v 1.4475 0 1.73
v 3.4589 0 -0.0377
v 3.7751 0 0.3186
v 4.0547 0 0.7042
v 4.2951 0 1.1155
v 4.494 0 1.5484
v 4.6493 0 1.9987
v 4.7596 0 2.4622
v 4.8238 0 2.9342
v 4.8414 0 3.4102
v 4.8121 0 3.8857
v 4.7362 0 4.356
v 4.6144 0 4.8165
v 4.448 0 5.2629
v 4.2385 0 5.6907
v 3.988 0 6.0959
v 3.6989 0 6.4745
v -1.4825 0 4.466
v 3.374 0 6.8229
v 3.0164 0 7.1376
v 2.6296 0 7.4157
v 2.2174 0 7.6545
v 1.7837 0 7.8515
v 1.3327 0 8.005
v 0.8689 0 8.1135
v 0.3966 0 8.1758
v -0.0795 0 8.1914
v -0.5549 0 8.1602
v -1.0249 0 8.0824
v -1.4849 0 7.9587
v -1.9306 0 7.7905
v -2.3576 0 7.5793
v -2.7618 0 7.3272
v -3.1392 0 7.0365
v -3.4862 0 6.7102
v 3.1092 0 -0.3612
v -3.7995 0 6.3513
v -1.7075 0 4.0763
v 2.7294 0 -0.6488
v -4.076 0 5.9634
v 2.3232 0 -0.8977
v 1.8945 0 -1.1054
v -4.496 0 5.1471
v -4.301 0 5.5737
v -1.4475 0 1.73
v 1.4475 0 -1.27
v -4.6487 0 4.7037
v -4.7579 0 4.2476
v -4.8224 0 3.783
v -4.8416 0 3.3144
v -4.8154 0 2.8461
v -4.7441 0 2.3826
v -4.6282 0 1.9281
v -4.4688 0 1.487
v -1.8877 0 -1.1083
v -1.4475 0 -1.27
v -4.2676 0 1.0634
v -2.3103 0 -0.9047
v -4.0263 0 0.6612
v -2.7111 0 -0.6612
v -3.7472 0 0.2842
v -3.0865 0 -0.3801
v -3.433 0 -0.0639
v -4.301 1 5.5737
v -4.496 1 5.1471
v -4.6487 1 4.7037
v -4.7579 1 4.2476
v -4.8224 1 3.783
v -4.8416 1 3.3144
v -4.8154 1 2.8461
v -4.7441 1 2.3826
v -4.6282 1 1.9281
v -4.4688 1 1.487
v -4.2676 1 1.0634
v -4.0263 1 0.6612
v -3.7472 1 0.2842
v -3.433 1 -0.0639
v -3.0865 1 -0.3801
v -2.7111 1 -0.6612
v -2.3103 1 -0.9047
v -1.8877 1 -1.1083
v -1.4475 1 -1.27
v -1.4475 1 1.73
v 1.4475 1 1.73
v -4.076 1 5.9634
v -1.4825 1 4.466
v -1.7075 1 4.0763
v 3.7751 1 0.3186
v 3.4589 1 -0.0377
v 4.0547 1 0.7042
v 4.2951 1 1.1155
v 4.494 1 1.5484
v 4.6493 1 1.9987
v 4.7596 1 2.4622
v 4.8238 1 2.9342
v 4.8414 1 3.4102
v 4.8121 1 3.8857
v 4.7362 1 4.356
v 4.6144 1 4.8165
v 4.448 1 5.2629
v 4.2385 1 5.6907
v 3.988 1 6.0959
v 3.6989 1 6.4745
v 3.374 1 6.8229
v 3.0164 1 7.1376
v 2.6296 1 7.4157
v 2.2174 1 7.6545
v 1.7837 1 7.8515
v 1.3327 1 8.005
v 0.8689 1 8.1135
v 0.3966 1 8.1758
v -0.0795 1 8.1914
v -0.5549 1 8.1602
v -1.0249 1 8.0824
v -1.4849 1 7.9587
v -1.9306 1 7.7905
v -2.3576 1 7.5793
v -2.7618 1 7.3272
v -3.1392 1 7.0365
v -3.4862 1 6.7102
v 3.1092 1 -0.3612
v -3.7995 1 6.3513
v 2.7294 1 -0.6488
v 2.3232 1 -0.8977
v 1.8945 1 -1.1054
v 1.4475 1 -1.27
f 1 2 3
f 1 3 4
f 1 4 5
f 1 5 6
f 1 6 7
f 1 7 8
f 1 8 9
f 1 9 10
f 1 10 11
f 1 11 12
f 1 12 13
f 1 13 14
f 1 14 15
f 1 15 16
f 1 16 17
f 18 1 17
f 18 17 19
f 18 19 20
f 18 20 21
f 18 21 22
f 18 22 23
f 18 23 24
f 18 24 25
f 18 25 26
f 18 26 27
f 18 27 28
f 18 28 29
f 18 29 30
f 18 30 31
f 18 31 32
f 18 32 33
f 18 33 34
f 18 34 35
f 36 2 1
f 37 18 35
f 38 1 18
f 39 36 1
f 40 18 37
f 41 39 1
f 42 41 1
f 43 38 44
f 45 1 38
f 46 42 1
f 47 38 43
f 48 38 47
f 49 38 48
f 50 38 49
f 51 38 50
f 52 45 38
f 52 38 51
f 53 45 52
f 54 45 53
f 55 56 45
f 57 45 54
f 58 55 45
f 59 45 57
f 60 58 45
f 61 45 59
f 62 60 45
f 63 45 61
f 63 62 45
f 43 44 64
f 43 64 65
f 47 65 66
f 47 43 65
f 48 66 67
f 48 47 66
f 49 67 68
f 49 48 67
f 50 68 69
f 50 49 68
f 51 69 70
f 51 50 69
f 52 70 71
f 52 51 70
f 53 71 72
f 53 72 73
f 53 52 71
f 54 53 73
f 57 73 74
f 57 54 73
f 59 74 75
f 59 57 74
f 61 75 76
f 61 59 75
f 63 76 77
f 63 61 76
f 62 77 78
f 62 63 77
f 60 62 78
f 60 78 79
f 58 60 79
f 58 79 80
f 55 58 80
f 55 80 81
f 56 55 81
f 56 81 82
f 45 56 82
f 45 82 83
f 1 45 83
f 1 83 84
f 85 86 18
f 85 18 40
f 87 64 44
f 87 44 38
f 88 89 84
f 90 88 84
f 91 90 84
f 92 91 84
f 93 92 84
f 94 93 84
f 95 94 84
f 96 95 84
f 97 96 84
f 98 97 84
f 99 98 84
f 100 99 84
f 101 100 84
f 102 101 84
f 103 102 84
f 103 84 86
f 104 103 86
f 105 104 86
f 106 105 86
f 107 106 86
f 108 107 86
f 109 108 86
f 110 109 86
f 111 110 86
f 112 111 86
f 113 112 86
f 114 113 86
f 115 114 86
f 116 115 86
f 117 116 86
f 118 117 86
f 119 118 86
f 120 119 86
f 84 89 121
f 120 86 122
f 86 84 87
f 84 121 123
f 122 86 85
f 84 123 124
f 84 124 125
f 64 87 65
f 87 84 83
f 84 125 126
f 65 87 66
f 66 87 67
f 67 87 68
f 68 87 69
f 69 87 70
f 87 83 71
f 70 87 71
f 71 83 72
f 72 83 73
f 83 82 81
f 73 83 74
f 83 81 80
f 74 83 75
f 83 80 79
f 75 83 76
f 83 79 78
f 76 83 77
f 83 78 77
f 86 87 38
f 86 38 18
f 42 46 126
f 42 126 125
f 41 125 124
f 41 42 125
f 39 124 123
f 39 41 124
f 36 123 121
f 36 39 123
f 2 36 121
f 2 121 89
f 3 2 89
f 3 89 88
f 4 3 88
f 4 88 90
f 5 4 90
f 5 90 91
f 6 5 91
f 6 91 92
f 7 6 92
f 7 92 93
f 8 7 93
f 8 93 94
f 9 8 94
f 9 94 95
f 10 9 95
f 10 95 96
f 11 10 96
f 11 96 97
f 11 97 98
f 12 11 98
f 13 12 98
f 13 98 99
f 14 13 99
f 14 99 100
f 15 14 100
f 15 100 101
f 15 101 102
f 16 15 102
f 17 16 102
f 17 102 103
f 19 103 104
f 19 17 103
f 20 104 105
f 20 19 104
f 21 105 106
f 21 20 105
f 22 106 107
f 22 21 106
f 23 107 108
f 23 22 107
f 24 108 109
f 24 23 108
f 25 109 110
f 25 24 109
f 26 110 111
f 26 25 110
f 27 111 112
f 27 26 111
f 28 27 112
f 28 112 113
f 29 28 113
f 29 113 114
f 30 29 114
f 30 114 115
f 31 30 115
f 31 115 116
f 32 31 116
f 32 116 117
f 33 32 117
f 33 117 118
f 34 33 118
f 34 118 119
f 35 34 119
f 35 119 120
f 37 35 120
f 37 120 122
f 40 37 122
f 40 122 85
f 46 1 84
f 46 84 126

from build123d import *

# Parameters (mm, degrees)
EXTRUDE_1_DEPTH     = 1
CUT_EXTRUDE_1_DEPTH = 1


with BuildPart() as part:
    # 스케치1 → 보스-돌출1 (new body)
    with BuildSketch(Plane(origin=(0, 0, 0), x_dir=(1, 0, 0), z_dir=(0, 1, 0))):
        with BuildLine():
            Line((-1.4475, -1.73), (1.4475, -1.73))
            Line((1.4475, -1.73), (1.4475, 1.27))
            ThreePointArc((1.4475, 1.27), (0, -8.192062176), (-1.4475, 1.27))
            Line((-1.4475, 1.27), (-1.4475, -1.73))
        make_face()
    extrude(amount=EXTRUDE_1_DEPTH)

    # 스케치2 → 컷-돌출1 (cut)
    with BuildSketch(Plane(origin=(0, 1, 0), x_dir=(1, 0, 0), z_dir=(0, 1, 0))):
        Polygon((-4.080578398, -5.96604295), (-4.305578398, -5.576331518), (-1.707502186, -4.076331518), (-1.482502186, -4.46604295), align=None)
    extrude(amount=-CUT_EXTRUDE_1_DEPTH, mode=Mode.SUBTRACT)


solid = part.part
